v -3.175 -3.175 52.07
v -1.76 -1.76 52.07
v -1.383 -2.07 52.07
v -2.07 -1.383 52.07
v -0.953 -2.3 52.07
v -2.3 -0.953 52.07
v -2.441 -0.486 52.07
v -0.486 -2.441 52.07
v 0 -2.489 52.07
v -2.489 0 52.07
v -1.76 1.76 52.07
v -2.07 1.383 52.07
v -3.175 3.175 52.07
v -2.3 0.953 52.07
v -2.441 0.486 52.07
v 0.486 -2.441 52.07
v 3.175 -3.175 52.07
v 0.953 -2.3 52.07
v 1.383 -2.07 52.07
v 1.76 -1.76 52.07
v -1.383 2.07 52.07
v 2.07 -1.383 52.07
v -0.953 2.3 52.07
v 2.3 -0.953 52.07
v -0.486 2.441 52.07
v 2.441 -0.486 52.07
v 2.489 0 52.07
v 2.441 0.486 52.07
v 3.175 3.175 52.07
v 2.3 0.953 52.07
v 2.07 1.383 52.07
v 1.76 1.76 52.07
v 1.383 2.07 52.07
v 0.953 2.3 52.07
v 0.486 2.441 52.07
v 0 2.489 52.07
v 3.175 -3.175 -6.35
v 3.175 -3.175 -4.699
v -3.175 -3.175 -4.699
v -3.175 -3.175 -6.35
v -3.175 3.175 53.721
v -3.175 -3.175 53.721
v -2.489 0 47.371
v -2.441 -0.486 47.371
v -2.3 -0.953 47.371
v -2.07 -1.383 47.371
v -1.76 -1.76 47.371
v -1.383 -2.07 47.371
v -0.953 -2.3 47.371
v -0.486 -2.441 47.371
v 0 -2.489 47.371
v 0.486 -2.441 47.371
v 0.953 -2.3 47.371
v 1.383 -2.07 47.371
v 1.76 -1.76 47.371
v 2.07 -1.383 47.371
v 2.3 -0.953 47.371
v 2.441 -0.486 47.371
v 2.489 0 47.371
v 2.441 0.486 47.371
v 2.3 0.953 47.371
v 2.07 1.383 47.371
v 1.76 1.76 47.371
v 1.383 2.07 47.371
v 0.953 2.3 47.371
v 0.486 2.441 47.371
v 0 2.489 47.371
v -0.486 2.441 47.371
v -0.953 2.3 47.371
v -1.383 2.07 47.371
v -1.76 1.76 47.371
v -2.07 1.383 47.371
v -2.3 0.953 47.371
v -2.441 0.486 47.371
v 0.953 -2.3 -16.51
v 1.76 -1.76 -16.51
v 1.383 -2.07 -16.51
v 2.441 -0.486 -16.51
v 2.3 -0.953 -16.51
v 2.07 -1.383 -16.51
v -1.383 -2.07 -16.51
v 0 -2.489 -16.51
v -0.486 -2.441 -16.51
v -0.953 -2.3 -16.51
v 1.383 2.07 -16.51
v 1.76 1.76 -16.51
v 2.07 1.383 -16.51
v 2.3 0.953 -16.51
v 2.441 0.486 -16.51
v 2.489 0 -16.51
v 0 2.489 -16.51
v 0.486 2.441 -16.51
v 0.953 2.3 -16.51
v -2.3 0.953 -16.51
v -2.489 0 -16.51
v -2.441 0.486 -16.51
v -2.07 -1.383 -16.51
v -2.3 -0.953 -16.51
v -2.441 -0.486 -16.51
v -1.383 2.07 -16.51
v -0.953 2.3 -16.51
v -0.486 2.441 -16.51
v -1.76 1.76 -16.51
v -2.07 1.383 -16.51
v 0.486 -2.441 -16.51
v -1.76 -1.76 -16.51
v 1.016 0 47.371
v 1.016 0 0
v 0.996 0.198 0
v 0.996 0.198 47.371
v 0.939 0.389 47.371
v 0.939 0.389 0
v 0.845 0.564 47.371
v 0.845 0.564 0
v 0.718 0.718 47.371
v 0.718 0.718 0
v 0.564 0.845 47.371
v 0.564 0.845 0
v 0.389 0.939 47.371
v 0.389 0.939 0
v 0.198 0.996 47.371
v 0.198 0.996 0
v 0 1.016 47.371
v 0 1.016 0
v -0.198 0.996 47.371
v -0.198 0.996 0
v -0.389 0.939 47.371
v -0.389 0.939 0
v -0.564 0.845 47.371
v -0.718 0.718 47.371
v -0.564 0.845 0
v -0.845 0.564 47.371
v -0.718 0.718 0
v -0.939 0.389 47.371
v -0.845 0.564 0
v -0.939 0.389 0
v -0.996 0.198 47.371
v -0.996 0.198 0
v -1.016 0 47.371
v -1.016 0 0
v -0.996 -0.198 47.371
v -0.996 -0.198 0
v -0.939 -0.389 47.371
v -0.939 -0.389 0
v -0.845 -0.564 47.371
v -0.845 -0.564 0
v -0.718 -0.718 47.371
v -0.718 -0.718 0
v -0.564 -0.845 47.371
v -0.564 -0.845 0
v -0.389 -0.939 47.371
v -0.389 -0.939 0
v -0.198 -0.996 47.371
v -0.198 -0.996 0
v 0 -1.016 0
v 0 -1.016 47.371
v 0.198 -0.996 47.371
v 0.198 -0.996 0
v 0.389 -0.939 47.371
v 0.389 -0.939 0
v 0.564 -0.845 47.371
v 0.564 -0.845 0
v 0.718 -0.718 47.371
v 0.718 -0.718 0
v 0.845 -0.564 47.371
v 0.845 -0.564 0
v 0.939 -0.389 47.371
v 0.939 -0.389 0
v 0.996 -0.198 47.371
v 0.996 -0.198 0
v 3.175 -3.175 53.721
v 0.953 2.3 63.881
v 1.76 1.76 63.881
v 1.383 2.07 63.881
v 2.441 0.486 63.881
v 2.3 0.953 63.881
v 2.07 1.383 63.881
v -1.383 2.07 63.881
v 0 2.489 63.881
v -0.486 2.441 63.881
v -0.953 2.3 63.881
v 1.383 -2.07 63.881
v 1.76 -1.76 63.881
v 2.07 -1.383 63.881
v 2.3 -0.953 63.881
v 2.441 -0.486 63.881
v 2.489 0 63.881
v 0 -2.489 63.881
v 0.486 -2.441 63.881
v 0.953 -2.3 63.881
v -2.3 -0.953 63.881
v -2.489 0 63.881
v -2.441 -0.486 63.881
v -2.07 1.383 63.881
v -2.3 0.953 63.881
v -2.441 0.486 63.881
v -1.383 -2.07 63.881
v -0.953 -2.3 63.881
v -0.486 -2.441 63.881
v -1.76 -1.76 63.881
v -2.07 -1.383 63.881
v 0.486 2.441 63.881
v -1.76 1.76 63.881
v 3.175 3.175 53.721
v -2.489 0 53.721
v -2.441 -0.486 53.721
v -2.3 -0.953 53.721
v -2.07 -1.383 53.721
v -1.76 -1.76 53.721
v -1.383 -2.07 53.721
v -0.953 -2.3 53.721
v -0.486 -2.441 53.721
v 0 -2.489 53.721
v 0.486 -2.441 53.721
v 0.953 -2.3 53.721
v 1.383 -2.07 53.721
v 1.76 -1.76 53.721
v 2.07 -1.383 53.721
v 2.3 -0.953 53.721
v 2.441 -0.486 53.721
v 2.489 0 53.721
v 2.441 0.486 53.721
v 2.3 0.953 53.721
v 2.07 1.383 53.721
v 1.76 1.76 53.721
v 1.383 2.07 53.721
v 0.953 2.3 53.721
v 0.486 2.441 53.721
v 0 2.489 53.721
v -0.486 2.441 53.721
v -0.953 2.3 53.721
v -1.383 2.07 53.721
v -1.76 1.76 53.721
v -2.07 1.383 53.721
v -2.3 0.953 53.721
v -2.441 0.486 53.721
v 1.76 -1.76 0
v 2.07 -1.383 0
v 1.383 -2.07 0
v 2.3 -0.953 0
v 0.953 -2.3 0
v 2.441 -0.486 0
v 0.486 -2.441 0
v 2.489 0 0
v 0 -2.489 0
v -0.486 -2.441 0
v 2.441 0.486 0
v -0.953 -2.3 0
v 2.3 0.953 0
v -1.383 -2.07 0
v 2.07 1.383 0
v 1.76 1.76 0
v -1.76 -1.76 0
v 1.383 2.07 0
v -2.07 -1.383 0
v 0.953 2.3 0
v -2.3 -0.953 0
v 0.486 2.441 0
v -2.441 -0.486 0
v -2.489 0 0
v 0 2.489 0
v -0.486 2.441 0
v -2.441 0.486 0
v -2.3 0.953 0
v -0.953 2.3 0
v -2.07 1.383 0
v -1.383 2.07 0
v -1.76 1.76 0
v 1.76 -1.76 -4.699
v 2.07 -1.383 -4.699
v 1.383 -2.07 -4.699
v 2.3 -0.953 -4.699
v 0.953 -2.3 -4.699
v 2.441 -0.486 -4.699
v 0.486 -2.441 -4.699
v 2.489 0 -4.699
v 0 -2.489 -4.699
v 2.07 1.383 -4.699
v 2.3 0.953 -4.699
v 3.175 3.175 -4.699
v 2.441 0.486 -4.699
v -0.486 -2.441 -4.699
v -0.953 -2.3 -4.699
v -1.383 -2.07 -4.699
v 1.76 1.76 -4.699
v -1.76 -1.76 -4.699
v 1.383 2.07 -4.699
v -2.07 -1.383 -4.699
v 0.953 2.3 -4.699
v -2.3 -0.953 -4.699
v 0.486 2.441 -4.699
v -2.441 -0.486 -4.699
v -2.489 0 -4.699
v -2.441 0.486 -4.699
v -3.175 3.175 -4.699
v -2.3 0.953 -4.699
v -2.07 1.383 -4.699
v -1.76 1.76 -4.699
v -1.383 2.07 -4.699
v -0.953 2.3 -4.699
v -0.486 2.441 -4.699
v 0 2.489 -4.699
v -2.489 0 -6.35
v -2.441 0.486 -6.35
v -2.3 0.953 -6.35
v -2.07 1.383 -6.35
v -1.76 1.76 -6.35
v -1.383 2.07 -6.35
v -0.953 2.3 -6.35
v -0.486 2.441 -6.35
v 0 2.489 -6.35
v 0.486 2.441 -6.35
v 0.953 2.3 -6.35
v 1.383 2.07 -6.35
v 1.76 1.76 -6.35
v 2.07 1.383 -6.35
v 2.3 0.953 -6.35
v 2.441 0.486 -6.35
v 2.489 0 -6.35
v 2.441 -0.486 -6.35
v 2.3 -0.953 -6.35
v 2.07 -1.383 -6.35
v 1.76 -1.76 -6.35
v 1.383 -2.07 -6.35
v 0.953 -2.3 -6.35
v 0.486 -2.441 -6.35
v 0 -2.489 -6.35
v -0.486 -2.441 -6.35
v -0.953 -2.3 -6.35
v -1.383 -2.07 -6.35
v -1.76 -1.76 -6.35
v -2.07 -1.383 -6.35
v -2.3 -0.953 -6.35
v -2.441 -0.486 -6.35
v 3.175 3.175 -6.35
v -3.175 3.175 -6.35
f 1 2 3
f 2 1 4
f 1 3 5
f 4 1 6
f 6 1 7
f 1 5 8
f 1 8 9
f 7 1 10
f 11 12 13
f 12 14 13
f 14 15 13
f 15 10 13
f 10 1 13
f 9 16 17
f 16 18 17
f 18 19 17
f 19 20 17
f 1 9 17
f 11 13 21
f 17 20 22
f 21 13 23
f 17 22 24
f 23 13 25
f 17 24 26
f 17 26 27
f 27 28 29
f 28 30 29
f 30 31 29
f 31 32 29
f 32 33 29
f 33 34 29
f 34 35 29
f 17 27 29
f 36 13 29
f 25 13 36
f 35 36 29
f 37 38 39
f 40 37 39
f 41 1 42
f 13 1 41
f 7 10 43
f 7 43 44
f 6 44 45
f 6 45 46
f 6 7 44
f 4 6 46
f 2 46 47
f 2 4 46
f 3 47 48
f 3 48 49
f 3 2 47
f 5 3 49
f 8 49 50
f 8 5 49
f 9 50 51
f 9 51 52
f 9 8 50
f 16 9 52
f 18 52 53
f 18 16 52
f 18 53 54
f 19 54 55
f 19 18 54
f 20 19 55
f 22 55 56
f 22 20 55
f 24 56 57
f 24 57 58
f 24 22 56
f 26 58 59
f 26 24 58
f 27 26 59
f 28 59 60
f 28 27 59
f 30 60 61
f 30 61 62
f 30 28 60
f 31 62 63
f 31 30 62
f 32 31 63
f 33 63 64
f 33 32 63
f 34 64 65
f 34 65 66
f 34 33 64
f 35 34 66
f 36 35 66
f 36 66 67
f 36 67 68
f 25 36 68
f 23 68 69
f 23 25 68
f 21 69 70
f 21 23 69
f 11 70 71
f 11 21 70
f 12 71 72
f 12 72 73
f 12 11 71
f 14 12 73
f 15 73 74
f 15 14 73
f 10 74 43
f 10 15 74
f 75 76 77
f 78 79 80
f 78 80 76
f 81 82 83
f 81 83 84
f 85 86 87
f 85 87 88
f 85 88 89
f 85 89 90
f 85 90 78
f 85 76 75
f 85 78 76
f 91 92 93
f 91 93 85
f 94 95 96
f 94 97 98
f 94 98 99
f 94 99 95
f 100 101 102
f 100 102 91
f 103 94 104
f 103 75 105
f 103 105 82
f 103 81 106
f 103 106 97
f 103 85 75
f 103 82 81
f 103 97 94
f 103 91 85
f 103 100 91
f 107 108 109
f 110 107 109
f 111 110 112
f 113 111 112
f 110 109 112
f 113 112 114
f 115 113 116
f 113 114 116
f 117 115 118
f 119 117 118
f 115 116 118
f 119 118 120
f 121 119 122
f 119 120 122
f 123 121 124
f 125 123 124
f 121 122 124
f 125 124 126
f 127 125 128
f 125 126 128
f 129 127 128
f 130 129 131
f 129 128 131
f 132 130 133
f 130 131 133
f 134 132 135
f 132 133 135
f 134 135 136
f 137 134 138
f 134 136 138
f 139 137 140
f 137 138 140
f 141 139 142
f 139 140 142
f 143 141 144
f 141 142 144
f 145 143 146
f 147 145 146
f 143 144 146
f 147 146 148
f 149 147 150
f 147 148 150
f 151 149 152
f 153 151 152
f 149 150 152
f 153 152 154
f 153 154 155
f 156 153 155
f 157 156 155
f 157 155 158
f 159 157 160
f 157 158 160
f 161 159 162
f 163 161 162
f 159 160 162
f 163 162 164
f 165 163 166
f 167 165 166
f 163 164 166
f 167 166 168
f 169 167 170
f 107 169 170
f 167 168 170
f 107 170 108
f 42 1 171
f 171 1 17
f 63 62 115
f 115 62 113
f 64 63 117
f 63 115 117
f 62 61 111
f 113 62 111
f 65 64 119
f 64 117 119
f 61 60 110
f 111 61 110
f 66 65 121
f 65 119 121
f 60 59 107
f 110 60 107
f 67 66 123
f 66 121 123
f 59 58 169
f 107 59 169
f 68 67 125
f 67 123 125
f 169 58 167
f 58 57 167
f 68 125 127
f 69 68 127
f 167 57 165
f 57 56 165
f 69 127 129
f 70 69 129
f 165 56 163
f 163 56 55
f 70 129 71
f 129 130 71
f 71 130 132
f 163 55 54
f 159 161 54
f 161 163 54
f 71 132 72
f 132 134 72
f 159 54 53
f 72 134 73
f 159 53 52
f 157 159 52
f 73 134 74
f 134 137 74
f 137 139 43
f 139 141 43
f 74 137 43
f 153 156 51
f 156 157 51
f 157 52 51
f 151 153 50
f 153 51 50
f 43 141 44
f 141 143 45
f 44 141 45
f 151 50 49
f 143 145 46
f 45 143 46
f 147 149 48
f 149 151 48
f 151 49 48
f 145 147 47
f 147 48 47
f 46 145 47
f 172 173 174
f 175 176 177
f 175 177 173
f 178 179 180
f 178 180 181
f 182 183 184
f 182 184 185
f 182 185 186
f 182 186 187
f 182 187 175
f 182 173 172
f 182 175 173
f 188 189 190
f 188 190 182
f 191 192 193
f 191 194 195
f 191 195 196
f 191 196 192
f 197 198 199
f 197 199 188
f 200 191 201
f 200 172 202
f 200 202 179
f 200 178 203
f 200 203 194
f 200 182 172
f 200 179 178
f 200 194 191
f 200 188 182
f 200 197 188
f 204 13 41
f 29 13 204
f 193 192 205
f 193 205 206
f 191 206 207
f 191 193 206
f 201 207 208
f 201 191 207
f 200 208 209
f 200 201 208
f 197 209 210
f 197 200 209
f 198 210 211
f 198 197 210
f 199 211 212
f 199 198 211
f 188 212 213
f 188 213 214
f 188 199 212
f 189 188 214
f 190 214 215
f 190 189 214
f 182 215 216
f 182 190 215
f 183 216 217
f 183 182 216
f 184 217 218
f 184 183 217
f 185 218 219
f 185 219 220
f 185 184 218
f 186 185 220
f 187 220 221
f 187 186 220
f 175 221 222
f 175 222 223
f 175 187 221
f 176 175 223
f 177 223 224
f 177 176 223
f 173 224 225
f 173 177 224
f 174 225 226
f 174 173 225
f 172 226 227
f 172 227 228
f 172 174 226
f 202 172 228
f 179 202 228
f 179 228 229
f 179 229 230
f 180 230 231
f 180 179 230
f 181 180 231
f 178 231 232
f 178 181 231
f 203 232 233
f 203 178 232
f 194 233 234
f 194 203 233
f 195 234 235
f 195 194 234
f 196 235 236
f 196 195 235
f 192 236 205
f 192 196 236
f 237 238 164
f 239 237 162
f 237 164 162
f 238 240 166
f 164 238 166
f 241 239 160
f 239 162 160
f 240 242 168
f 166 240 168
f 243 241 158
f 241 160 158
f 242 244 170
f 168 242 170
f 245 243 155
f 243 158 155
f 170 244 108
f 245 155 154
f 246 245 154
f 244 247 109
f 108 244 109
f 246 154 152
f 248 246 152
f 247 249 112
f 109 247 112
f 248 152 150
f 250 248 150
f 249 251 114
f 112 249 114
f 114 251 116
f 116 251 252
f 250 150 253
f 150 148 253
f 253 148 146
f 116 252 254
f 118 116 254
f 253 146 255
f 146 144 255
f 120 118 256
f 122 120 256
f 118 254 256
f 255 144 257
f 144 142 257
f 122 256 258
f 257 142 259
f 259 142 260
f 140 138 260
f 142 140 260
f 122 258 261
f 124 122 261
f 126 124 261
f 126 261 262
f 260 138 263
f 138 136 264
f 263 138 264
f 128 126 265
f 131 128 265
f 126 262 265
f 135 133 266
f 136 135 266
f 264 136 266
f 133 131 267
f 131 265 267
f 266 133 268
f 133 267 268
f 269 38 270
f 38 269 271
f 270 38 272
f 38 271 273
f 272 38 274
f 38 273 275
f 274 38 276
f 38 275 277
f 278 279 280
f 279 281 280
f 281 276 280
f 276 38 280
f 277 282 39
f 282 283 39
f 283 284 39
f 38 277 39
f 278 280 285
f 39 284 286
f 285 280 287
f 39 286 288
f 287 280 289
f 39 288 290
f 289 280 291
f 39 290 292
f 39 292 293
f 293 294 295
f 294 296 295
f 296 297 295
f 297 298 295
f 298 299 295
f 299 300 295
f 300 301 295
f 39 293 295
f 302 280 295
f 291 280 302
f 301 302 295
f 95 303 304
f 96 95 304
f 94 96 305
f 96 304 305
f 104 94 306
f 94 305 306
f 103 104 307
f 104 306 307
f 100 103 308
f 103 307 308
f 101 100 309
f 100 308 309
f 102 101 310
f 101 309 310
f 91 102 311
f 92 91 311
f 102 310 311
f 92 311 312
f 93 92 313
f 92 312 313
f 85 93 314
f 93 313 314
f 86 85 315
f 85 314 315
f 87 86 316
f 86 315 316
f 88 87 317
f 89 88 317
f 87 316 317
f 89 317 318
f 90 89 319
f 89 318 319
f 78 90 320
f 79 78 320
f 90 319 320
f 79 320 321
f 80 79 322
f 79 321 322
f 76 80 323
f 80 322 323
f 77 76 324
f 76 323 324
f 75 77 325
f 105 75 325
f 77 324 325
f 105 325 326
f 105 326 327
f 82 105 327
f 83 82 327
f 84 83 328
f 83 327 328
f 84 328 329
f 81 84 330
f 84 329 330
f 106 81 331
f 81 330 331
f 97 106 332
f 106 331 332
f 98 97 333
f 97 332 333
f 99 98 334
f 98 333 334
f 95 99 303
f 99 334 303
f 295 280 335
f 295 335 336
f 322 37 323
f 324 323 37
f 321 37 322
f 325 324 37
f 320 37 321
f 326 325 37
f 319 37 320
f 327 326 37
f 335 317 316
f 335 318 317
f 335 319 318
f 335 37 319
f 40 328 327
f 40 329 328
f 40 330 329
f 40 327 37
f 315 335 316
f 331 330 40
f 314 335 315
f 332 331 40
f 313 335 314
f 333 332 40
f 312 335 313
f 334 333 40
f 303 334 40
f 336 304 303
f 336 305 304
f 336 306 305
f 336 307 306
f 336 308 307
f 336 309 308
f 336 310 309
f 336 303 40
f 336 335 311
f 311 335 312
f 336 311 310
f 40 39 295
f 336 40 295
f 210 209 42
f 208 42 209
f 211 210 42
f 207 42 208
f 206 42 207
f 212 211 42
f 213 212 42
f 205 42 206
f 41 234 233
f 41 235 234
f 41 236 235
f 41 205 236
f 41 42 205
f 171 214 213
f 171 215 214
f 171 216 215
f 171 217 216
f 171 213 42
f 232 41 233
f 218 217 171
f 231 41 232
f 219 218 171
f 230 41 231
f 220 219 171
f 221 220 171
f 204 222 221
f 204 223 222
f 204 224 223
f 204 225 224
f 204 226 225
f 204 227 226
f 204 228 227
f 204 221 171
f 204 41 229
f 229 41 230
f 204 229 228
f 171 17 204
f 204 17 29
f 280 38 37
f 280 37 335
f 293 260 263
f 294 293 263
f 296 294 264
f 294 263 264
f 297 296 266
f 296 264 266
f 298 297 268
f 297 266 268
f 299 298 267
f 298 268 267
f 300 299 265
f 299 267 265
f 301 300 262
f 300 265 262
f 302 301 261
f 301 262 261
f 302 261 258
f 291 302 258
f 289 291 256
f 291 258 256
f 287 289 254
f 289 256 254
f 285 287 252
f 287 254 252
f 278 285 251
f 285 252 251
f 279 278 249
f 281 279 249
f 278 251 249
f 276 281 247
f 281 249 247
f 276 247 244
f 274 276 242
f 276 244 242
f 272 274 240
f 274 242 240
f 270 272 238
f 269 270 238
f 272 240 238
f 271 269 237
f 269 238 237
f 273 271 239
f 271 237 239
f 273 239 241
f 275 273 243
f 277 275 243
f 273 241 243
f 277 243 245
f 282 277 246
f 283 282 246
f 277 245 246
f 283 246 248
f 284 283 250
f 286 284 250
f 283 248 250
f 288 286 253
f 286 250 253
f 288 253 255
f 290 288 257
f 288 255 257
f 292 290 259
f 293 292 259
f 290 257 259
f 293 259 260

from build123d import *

# Parameters (mm, degrees)
SKETCH1_R           = 1.016
BOSS_EXTRUDE1_DEPTH = 47.371
SKETCH2_R           = 2.4892
BOSS_EXTRUDE2_DEPTH = 4.699
SKETCH3_W           = 6.35
SKETCH3_H           = 6.35
BOSS_EXTRUDE3_DEPTH = 1.651
SKETCH4_R           = 2.4892
BOSS_EXTRUDE4_DEPTH = 10.16
BOSS_EXTRUDE5_START = 4.699
SKETCH5_R           = 2.4892
BOSS_EXTRUDE5_DEPTH = 4.699
SKETCH6_W           = 6.35
SKETCH6_H           = 6.35
BOSS_EXTRUDE6_DEPTH = 1.651
BOSS_EXTRUDE7_START = 10.16
SKETCH7_R           = 2.4892
BOSS_EXTRUDE7_DEPTH = 10.16


with BuildPart() as part:
    # Sketch1 → Boss-Extrude1 (new body)
    with BuildSketch(Plane.XY):
        Circle(SKETCH1_R)
    extrude(amount=BOSS_EXTRUDE1_DEPTH)

    # Sketch2 → Boss-Extrude2 (add)
    with BuildSketch(Plane(origin=(0, 0, 0), x_dir=(-1, 0, 0), z_dir=(0, 0, -1))):
        Circle(SKETCH2_R)
    extrude(amount=BOSS_EXTRUDE2_DEPTH)

    # Sketch3 → Boss-Extrude3 (add)
    with BuildSketch(Plane(origin=(0, 0, -4.699), x_dir=(-1, 0, 0), z_dir=(0, 0, -1))):
        Rectangle(SKETCH3_W, SKETCH3_H)
    extrude(amount=BOSS_EXTRUDE3_DEPTH)

    # Sketch4 → Boss-Extrude4 (add)
    with BuildSketch(Plane(origin=(0, 0, -6.35), x_dir=(-1, 0, 0), z_dir=(0, 0, -1))):
        Circle(SKETCH4_R)
    extrude(amount=BOSS_EXTRUDE4_DEPTH)

    # Sketch5 → Boss-Extrude5 (add)
    with BuildSketch(Plane.XY.offset(47.371).offset(BOSS_EXTRUDE5_START)):
        with Locations(Location((0, 0, 0), (0, 0, 180))):
            Circle(SKETCH5_R)
    extrude(amount=-BOSS_EXTRUDE5_DEPTH)

    # Sketch6 → Boss-Extrude6 (add)
    with BuildSketch(Plane.XY.offset(52.07)):
        Rectangle(SKETCH6_W, SKETCH6_H)
    extrude(amount=BOSS_EXTRUDE6_DEPTH)

    # Sketch7 → Boss-Extrude7 (add)
    with BuildSketch(Plane.XY.offset(53.721).offset(BOSS_EXTRUDE7_START)):
        with Locations(Location((0, 0, 0), (0, 0, 180))):
            Circle(SKETCH7_R)
    extrude(amount=-BOSS_EXTRUDE7_DEPTH)


solid = part.part
